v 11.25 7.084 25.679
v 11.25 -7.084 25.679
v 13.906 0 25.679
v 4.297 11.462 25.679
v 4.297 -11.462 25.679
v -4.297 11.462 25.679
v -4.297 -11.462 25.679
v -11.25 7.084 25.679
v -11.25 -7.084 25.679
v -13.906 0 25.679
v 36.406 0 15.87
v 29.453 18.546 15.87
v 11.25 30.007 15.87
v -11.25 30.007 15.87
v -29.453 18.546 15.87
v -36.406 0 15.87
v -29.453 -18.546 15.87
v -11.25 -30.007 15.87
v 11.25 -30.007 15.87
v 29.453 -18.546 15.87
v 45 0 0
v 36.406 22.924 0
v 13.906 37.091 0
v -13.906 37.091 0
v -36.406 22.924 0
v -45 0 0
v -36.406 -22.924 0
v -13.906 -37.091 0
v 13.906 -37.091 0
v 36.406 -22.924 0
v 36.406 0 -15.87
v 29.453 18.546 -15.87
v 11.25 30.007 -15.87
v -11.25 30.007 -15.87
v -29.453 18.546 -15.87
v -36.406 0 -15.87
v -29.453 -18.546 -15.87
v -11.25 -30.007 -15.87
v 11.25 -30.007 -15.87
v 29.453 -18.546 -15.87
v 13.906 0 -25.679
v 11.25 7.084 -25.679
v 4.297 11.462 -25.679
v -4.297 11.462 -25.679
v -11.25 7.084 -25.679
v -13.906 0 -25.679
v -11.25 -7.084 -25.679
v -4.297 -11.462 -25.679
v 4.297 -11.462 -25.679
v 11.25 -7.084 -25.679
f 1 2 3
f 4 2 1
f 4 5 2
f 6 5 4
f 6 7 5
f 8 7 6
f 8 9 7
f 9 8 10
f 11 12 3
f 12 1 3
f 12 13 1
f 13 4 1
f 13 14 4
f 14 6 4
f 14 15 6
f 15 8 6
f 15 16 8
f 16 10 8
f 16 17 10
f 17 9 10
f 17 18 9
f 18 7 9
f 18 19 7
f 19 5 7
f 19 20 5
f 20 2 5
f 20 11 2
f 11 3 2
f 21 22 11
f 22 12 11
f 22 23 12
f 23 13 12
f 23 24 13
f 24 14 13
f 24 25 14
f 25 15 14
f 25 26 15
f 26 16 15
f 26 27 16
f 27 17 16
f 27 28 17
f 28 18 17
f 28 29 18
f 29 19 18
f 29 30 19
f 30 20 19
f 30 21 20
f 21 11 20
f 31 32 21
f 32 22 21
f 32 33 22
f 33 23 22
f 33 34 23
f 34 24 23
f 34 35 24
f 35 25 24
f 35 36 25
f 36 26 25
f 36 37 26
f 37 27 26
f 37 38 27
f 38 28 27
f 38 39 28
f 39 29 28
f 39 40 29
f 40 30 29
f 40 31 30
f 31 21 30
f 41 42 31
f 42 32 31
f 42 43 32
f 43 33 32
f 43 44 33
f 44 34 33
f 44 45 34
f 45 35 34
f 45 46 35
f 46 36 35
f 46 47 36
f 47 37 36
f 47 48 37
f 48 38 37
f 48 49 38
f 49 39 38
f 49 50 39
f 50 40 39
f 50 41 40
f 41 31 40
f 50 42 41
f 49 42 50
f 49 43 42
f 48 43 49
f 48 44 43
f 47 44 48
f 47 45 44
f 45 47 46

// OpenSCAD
// Generated by SolidPython 1.0.1 on 2020-07-29 00:46:52


scale(v = [15, 13, 9]) {
	sphere(r = 3);
}
/***********************************************
*********      SolidPython code:      **********
************************************************
 
# import packages: SolidPython
from solid import *
from solid.utils import *
from itertools import chain, combinations, permutations


class Resize:

    def __init__(self, scad_file):
        self.scad_file = scad_file
        #self.scad_file = import_scad(scad_file)
        # cone/cylinder param:
        self.r1 = 0
        self.r2 = 0
        self.h = 0
        # rectangular prism param:
        self.w = 0
        self.l = 0
        # ellipse param:
        self.r = 0

    # import OpenScad code (file name corresponds to shape)


    # classify shape + parameters
    def assign(self, param1, param2, param3):
        if self.scad_file == 'cone.scad':
            self.r1 = param1
            self.r2 = param2
            self.h = param3
        elif self.scad_file == 'cylinder.scad':
            self.r1 = param1
            self.r2 = param2
            self.h = param3
        elif self.scad_file == 'rectangularPrism.scad':
            self.h = param1
            self.l = param2
            self.w = param3
        else:
            self.r = param1
            self.h = param2

    # resize parameters
    def iterate(self):
        x = range(3, 20, 2)
        i = 1
        if self.scad_file == 'cone.scad':
            tempList = list(permutations(x, 2))
            for temp in tempList:
                param1 = temp[0]
                param2 = temp[1]
                filepath = 'produced_scad_files/' + 'cone' + str(param1) + '_' + str(param2) + '_' + '.scad'
                scad_render_to_file(cylinder(h=param1, r1=param2, r2=0), filepath)

        elif self.scad_file == 'cylinder.scad':
            tempList = list(permutations(x, 3))
            for temp in tempList:
                param1 = temp[0]
                param2 = temp[1]
                filepath = 'produced_scad_files/' + 'cylinder' + str(param1) + '_' + str(param2) + '_' + '.scad'
                scad_render_to_file(cylinder(h=param1, r1=param2, r2=param2), filepath)

        elif self.scad_file == 'rectangularPrism.scad':
            tempList = list(permutations(x, 3))
            for temp in tempList:
                param1 = temp[0]
                param2 = temp[1]
                param3 = temp[2]
                filepath = 'produced_scad_files/' + 'rectangularPrism' + str(param1) + '_' + str(param2) + '_' + str(
                    param3) + '.scad'
                scad_render_to_file(cube(size=(param1, param2, param3)), filepath)

        elif self.scad_file == 'ellipse.scad':
            tempList = list(permutations(x, 4))
            for temp in tempList:
                param1 = temp[0]
                param2 = temp[1]
                param3 = temp[2]
                param4 = temp[3]
                filepath = 'produced_scad_files/' + 'ellipse' + str(param1) + '_' + str(param2) + '_' + str(param3) + '_' + str(param4) + '.scad'
                scad_render_to_file(scale([param1, param2, param3])(sphere(r=param4)), filepath)

    def render_to_scadfile(self):
        scad_render_to_file(scad, 'example.scad') 
 
************************************************/
